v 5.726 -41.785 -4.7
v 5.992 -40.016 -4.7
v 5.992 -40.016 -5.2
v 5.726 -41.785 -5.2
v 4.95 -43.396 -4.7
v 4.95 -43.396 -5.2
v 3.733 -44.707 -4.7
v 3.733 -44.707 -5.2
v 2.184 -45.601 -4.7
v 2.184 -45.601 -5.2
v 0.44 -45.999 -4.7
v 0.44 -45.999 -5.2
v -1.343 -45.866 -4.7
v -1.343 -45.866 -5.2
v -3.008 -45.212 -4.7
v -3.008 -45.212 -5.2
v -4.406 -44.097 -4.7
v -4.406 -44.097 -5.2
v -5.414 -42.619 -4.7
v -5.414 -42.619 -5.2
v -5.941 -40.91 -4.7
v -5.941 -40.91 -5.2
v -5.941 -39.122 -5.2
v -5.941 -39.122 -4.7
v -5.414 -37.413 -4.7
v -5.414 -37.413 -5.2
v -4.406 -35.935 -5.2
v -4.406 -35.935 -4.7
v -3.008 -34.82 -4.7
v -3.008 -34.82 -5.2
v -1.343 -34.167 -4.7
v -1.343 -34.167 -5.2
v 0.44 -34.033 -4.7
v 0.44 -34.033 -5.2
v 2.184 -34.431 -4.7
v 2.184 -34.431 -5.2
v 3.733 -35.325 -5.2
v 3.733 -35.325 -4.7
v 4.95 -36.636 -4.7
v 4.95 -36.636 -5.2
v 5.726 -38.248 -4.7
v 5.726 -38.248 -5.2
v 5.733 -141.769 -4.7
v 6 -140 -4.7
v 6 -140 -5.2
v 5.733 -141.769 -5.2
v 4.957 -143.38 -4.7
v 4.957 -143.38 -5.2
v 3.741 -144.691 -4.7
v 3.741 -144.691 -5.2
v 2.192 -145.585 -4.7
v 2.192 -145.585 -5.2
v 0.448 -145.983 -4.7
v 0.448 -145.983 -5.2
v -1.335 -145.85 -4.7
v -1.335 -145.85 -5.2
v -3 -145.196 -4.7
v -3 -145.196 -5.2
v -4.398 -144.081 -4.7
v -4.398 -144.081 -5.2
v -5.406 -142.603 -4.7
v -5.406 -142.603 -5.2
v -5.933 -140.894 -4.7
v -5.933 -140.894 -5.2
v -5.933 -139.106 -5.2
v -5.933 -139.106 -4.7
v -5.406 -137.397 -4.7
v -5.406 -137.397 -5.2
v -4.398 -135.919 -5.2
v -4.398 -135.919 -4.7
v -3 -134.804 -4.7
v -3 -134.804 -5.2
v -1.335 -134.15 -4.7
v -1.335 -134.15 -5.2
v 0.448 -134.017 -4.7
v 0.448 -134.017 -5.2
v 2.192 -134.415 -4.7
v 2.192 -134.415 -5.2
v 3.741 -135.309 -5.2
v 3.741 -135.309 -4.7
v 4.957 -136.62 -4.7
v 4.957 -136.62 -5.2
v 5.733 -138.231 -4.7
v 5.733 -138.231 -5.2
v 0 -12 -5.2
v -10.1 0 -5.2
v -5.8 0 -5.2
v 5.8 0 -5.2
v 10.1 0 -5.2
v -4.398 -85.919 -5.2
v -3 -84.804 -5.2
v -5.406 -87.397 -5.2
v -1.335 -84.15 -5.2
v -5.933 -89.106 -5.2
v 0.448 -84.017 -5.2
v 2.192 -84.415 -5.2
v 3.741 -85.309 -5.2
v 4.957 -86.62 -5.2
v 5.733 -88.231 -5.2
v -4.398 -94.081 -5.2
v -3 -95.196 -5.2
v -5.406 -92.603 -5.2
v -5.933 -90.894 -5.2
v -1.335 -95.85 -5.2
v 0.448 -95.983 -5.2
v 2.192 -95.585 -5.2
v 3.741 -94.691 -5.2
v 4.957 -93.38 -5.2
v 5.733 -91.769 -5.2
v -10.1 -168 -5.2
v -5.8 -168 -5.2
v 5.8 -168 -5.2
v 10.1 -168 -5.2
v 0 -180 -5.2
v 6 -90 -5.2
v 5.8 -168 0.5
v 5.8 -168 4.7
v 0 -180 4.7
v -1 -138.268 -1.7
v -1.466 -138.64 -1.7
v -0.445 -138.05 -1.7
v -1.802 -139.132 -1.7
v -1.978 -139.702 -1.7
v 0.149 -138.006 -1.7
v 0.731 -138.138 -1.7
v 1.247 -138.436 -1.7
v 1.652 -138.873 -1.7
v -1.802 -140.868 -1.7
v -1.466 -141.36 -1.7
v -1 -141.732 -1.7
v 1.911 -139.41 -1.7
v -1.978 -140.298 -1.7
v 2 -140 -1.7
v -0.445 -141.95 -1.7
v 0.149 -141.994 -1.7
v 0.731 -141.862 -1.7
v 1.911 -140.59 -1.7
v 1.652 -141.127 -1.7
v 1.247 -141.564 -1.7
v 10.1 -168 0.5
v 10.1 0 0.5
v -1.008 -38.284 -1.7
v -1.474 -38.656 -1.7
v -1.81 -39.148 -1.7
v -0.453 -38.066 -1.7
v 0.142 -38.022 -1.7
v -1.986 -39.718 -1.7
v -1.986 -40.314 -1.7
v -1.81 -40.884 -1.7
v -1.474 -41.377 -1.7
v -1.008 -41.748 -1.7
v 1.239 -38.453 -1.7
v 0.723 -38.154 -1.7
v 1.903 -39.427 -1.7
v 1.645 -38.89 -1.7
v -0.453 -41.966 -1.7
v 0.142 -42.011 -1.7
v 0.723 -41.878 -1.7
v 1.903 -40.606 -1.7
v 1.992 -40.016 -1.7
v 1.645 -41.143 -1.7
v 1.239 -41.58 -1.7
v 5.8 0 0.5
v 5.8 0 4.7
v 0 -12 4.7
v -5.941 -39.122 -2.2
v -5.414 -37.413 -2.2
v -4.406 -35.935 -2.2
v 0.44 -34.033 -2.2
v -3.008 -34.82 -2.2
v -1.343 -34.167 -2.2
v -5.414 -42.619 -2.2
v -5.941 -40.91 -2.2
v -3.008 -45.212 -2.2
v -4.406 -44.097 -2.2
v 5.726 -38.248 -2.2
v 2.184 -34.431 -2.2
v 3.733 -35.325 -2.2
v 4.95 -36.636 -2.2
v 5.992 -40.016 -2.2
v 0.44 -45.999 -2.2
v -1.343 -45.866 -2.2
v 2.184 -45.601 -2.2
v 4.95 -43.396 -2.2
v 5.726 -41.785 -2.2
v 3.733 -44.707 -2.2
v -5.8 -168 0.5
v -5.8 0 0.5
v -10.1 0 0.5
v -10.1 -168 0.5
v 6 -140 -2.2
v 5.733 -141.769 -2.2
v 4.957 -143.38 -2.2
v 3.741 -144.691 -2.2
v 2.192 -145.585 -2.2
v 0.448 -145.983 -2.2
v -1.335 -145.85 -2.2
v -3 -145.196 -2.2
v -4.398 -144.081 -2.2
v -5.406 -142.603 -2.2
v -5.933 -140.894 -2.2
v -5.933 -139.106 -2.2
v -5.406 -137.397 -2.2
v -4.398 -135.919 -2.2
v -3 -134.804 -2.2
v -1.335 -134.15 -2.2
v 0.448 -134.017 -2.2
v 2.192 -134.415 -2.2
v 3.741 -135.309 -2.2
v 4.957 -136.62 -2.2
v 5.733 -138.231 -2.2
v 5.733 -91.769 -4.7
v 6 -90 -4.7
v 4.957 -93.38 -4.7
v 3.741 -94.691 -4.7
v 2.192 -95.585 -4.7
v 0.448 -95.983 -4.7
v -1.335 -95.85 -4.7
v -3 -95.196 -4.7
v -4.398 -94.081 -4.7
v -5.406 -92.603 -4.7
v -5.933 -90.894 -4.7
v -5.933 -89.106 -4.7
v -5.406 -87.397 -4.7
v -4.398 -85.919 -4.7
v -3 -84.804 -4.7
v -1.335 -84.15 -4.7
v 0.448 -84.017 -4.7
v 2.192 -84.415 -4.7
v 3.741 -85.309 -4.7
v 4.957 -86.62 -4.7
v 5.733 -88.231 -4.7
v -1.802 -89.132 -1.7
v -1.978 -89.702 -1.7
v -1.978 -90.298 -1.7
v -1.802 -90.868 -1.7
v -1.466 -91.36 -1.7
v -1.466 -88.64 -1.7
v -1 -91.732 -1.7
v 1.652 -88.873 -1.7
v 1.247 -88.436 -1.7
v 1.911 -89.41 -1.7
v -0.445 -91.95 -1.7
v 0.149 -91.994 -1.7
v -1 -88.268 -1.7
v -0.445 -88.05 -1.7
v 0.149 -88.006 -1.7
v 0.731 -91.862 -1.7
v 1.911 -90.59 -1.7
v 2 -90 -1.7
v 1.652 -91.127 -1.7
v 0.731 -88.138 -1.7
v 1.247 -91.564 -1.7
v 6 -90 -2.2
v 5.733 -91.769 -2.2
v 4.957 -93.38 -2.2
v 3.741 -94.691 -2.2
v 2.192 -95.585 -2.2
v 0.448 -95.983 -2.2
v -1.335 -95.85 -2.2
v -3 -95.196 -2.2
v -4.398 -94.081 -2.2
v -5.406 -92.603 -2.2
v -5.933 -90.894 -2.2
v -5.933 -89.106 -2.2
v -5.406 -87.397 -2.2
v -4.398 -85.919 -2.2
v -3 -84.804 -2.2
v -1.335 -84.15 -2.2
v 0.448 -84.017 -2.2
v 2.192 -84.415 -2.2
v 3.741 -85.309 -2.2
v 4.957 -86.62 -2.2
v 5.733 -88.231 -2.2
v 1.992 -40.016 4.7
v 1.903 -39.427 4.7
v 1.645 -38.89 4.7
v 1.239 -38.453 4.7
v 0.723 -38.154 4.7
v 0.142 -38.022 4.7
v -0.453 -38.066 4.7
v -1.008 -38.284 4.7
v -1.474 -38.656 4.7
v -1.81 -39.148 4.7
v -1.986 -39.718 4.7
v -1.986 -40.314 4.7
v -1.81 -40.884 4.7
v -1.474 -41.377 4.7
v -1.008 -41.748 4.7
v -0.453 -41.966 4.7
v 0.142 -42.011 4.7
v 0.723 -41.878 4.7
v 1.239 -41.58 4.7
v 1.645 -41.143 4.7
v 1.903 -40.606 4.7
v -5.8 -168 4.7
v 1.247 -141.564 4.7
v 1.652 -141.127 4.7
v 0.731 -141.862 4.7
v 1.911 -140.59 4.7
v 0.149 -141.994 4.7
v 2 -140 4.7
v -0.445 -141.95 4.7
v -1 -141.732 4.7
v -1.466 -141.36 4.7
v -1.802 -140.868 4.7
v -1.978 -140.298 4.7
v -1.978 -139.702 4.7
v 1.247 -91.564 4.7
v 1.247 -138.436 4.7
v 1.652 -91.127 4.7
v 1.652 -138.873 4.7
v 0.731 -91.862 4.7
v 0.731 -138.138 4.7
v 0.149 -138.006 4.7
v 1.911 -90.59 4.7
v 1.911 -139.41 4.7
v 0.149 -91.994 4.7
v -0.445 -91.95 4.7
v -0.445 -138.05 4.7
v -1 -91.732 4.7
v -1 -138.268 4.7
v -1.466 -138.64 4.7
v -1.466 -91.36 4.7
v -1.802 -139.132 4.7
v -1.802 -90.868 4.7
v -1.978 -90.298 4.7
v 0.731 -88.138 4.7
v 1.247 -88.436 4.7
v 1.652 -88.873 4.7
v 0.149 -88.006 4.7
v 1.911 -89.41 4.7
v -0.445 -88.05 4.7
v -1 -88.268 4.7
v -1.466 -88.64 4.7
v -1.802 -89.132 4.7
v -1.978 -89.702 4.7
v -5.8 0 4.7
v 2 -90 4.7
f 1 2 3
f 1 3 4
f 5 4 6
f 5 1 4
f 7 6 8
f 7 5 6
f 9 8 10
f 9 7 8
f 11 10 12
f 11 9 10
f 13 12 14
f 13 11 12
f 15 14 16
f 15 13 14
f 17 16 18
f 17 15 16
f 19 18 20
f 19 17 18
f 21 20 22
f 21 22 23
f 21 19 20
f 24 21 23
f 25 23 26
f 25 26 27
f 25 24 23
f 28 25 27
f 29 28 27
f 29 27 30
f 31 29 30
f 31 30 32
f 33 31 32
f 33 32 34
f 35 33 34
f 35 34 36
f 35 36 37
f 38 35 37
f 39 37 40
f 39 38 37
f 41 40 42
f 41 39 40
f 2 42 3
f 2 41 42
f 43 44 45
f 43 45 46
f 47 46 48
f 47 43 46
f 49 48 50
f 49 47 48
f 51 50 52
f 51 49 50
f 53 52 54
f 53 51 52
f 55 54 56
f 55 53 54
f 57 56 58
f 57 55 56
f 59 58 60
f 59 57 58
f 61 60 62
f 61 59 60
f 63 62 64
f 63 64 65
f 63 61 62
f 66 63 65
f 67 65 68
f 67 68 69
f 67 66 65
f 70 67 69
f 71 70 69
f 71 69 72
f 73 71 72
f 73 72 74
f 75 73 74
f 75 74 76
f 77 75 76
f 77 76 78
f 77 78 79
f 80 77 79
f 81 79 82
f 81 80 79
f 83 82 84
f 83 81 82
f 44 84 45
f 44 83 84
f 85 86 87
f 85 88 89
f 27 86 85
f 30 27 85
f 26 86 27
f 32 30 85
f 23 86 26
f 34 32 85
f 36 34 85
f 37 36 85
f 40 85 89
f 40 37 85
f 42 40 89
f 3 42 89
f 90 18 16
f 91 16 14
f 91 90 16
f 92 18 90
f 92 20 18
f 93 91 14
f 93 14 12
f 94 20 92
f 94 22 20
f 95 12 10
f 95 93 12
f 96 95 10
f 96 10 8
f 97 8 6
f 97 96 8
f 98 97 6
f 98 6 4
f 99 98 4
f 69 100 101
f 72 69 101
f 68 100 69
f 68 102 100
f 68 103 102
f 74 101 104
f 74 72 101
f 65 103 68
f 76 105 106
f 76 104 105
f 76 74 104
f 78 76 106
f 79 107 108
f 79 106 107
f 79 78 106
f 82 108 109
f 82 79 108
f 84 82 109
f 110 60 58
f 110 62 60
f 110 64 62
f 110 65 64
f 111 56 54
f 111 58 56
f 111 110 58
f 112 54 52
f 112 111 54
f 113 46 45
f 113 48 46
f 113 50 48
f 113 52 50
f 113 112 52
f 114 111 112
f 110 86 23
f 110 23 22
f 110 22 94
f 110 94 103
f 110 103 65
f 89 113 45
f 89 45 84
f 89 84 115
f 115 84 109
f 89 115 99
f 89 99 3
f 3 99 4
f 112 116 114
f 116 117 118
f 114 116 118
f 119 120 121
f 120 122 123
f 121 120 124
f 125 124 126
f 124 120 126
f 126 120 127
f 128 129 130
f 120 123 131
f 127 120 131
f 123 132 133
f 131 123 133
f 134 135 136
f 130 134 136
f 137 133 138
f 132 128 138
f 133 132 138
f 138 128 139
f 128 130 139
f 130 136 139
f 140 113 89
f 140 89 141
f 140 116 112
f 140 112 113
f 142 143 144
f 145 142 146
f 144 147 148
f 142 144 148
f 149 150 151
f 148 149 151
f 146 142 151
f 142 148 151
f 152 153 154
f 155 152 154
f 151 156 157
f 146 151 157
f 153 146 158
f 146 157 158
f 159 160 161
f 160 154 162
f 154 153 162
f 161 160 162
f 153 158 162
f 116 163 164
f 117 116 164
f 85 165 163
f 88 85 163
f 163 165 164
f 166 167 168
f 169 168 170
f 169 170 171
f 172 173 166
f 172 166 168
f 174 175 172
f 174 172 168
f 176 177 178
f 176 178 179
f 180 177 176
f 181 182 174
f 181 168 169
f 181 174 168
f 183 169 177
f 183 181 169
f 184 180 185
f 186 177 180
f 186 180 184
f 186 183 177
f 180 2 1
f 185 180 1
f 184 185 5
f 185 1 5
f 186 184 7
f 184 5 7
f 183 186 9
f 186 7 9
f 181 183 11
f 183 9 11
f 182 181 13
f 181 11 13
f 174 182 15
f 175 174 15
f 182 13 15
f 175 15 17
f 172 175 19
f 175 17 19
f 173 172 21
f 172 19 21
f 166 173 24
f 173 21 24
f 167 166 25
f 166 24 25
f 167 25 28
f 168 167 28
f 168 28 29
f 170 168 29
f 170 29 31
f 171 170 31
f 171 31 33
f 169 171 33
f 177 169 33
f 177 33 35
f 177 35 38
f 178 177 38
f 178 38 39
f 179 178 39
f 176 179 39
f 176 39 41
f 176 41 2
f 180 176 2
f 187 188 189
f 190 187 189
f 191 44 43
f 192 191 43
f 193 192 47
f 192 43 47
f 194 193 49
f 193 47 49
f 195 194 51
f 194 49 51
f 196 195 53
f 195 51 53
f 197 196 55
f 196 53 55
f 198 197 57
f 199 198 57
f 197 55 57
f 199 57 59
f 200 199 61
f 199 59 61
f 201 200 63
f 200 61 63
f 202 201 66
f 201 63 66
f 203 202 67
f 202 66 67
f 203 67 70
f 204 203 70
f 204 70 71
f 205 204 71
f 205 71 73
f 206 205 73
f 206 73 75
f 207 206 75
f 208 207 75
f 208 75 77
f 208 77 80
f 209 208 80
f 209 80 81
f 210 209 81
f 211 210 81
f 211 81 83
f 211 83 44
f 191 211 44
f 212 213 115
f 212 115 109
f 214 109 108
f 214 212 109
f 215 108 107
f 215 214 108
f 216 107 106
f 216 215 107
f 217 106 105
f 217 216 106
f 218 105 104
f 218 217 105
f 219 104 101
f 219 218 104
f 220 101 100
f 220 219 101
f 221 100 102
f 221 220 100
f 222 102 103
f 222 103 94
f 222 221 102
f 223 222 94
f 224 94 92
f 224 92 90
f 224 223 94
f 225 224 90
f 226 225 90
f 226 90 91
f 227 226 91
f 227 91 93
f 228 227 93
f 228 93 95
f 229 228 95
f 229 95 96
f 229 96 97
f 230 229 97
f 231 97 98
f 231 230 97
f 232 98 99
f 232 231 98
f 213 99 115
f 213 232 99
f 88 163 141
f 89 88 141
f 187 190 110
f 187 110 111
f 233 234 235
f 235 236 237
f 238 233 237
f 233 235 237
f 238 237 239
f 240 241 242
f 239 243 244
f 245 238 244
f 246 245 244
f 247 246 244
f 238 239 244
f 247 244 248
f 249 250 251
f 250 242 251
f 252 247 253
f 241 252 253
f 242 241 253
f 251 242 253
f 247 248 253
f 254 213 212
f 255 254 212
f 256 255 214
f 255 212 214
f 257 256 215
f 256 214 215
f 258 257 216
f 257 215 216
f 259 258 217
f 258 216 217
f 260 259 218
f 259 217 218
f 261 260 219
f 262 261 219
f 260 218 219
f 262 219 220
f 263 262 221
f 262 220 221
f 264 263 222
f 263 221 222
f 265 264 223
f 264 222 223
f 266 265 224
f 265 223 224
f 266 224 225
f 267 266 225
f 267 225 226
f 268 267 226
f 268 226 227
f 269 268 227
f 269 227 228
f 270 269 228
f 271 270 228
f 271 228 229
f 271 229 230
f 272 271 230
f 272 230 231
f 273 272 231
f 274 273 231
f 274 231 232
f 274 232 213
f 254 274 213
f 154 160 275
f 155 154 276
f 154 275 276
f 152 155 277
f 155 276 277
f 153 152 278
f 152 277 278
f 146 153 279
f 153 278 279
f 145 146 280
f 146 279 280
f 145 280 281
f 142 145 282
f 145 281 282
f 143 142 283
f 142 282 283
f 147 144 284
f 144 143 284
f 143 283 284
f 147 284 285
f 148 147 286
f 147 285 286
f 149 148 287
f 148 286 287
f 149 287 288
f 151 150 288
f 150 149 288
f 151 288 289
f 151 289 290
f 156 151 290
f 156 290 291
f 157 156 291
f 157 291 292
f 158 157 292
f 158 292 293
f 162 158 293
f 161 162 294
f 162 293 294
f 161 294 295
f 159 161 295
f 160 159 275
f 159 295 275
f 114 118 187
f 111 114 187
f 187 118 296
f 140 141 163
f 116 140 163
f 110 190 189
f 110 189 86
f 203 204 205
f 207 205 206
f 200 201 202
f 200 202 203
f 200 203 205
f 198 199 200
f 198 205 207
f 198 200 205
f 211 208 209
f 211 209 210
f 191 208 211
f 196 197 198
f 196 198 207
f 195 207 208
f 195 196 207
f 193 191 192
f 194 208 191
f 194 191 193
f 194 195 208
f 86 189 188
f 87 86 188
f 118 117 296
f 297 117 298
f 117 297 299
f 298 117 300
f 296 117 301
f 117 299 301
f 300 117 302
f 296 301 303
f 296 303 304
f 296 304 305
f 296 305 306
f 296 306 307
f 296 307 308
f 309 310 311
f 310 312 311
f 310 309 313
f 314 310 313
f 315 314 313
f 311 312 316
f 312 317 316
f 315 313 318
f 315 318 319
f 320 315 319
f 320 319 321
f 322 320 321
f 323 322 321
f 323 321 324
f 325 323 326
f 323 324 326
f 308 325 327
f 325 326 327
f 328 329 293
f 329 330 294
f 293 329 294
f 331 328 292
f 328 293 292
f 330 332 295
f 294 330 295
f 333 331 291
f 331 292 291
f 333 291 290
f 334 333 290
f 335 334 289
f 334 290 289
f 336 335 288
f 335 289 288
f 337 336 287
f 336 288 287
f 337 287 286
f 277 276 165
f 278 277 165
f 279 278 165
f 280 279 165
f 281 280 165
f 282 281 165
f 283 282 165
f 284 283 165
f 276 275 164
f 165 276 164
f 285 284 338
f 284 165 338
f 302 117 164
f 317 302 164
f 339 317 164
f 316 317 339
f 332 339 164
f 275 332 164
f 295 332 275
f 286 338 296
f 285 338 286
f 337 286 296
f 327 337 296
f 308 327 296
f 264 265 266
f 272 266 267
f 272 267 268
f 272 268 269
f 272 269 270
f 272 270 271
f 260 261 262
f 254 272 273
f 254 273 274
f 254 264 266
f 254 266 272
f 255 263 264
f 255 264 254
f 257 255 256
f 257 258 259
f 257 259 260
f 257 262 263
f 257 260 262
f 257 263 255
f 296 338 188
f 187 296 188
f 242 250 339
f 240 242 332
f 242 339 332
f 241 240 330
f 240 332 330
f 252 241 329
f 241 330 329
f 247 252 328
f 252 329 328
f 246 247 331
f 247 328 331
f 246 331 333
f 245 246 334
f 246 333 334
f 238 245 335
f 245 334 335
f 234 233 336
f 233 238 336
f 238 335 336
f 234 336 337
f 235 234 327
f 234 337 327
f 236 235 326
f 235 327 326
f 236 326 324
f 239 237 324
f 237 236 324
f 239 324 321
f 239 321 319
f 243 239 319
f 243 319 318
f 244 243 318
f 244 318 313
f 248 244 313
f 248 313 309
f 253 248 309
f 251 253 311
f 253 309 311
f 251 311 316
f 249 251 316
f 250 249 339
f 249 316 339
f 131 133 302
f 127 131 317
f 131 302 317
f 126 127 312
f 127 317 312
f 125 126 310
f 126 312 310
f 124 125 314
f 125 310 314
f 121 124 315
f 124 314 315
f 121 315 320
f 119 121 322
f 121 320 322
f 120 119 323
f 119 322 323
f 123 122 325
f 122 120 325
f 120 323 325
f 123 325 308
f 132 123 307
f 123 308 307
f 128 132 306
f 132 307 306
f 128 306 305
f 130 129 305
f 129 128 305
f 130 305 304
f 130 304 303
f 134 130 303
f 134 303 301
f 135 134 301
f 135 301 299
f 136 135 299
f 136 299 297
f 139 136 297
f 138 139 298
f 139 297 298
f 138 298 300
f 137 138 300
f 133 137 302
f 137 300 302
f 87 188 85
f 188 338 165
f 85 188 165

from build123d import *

# Parameters (mm, degrees)
F1_DEPTH   = 180
F2_R       = 2
F3_DEPTH   = 25
F4_R       = 6
F4_R_2     = 2
F5_DEPTH   = 3
F6_W       = 14.0674761496
F6_H       = 116.9483624399
F1_FACE1_W = 20.2
F1_FACE1_H = 180
F1_FACE1_R = 6
F7_DEPTH   = 0.5
F9_DEPTH   = 25
F10_W      = 4.3
F10_H      = 12
F11_DEPTH  = 25
F12_W      = 4.3
F12_H      = 12
F13_DEPTH  = 25


with BuildPart() as f1:
    # F0 (on Front) → F1 (new body)
    with BuildSketch(Plane.XZ):
        Polygon((5.8, 4.7), (-5.8, 4.7), (-5.8, 0.5), (-10.1, 0.5), (-10.1, -4.7), (10.1, -4.7), (10.1, 0.5), (5.8, 0.5), align=None)
    extrude(amount=F1_DEPTH)

    # F2 (on face) → F3 (cut)
    with BuildSketch(Plane.XY.offset(4.7)):
        with Locations((0, -140)):
            Circle(F2_R)
        with Locations((0, -90)):
            Circle(F2_R)
        with Locations((-0.0078984785, -40.0161966681)):
            Circle(F2_R)
    extrude(amount=-F3_DEPTH, mode=Mode.SUBTRACT)

    # F4 (on face) → F5 (cut)
    with BuildSketch(Plane(origin=(0, 0, -4.7), x_dir=(1, 0, 0), z_dir=(0, 0, -1))):
        with Locations((-0.0078984785, 40.0161966681)):
            Circle(F4_R)
        with Locations((-0.0078984785, 40.0161966681)):
            Circle(F4_R_2, mode=Mode.SUBTRACT)
        with Locations((0, 90)):
            Circle(F4_R)
        with Locations((0, 90)):
            Circle(F4_R_2, mode=Mode.SUBTRACT)
        with Locations((0, 140)):
            Circle(F4_R)
        with Locations((0, 140)):
            Circle(F4_R_2, mode=Mode.SUBTRACT)
    extrude(amount=-F5_DEPTH, mode=Mode.SUBTRACT)

    # F6 (on face) + F1_face1 (on face) → F7 (join)
    with BuildSketch(Plane(origin=(0, 0, -1.7), x_dir=(1, 0, 0), z_dir=(0, 0, -1))):
        with Locations((0.141544966, 90.3544295579)):
            Rectangle(F6_W, F6_H)
    with BuildSketch(Plane(origin=(2.75839e-05, -89.9999434363, -4.7), x_dir=(1, 0, 0), z_dir=(0, 0, -1))):
        with Locations((-2.75839e-05, 5.65637e-05)):
            Rectangle(F1_FACE1_W, F1_FACE1_H)
        with Locations((-2.75839e-05, 50.0000565637)):
            Circle(F1_FACE1_R, mode=Mode.SUBTRACT)
        with Locations((-0.0079260625, -49.9837467681)):
            Circle(F1_FACE1_R, mode=Mode.SUBTRACT)
        with Locations((-2.75839e-05, 5.65637e-05)):
            Circle(F1_FACE1_R, mode=Mode.SUBTRACT)
    extrude(amount=F7_DEPTH)

    # F8 (on face) → F9 (cut)
    with BuildSketch(Plane.XY.offset(4.7)):
        Polygon((5.8, -180), (5.8, -168), (0, -180), align=None)
        Polygon((0, -180), (-5.8, -168), (-5.8, -180), align=None)
        Polygon((0, -12), (5.8, 0), (-5.8, 0), align=None)
    extrude(amount=-F9_DEPTH, mode=Mode.SUBTRACT)

    # F10 (on face) → F11 (cut)
    with BuildSketch(Plane.XY.offset(0.5)):
        with Locations((7.95, -174)):
            Rectangle(F10_W, F10_H)
    extrude(amount=-F11_DEPTH, mode=Mode.SUBTRACT)

    # F12 (on face) → F13 (cut)
    with BuildSketch(Plane.XY.offset(0.5)):
        with Locations((-7.95, -174)):
            Rectangle(F12_W, F12_H)
    extrude(amount=-F13_DEPTH, mode=Mode.SUBTRACT)


solid = f1.part
